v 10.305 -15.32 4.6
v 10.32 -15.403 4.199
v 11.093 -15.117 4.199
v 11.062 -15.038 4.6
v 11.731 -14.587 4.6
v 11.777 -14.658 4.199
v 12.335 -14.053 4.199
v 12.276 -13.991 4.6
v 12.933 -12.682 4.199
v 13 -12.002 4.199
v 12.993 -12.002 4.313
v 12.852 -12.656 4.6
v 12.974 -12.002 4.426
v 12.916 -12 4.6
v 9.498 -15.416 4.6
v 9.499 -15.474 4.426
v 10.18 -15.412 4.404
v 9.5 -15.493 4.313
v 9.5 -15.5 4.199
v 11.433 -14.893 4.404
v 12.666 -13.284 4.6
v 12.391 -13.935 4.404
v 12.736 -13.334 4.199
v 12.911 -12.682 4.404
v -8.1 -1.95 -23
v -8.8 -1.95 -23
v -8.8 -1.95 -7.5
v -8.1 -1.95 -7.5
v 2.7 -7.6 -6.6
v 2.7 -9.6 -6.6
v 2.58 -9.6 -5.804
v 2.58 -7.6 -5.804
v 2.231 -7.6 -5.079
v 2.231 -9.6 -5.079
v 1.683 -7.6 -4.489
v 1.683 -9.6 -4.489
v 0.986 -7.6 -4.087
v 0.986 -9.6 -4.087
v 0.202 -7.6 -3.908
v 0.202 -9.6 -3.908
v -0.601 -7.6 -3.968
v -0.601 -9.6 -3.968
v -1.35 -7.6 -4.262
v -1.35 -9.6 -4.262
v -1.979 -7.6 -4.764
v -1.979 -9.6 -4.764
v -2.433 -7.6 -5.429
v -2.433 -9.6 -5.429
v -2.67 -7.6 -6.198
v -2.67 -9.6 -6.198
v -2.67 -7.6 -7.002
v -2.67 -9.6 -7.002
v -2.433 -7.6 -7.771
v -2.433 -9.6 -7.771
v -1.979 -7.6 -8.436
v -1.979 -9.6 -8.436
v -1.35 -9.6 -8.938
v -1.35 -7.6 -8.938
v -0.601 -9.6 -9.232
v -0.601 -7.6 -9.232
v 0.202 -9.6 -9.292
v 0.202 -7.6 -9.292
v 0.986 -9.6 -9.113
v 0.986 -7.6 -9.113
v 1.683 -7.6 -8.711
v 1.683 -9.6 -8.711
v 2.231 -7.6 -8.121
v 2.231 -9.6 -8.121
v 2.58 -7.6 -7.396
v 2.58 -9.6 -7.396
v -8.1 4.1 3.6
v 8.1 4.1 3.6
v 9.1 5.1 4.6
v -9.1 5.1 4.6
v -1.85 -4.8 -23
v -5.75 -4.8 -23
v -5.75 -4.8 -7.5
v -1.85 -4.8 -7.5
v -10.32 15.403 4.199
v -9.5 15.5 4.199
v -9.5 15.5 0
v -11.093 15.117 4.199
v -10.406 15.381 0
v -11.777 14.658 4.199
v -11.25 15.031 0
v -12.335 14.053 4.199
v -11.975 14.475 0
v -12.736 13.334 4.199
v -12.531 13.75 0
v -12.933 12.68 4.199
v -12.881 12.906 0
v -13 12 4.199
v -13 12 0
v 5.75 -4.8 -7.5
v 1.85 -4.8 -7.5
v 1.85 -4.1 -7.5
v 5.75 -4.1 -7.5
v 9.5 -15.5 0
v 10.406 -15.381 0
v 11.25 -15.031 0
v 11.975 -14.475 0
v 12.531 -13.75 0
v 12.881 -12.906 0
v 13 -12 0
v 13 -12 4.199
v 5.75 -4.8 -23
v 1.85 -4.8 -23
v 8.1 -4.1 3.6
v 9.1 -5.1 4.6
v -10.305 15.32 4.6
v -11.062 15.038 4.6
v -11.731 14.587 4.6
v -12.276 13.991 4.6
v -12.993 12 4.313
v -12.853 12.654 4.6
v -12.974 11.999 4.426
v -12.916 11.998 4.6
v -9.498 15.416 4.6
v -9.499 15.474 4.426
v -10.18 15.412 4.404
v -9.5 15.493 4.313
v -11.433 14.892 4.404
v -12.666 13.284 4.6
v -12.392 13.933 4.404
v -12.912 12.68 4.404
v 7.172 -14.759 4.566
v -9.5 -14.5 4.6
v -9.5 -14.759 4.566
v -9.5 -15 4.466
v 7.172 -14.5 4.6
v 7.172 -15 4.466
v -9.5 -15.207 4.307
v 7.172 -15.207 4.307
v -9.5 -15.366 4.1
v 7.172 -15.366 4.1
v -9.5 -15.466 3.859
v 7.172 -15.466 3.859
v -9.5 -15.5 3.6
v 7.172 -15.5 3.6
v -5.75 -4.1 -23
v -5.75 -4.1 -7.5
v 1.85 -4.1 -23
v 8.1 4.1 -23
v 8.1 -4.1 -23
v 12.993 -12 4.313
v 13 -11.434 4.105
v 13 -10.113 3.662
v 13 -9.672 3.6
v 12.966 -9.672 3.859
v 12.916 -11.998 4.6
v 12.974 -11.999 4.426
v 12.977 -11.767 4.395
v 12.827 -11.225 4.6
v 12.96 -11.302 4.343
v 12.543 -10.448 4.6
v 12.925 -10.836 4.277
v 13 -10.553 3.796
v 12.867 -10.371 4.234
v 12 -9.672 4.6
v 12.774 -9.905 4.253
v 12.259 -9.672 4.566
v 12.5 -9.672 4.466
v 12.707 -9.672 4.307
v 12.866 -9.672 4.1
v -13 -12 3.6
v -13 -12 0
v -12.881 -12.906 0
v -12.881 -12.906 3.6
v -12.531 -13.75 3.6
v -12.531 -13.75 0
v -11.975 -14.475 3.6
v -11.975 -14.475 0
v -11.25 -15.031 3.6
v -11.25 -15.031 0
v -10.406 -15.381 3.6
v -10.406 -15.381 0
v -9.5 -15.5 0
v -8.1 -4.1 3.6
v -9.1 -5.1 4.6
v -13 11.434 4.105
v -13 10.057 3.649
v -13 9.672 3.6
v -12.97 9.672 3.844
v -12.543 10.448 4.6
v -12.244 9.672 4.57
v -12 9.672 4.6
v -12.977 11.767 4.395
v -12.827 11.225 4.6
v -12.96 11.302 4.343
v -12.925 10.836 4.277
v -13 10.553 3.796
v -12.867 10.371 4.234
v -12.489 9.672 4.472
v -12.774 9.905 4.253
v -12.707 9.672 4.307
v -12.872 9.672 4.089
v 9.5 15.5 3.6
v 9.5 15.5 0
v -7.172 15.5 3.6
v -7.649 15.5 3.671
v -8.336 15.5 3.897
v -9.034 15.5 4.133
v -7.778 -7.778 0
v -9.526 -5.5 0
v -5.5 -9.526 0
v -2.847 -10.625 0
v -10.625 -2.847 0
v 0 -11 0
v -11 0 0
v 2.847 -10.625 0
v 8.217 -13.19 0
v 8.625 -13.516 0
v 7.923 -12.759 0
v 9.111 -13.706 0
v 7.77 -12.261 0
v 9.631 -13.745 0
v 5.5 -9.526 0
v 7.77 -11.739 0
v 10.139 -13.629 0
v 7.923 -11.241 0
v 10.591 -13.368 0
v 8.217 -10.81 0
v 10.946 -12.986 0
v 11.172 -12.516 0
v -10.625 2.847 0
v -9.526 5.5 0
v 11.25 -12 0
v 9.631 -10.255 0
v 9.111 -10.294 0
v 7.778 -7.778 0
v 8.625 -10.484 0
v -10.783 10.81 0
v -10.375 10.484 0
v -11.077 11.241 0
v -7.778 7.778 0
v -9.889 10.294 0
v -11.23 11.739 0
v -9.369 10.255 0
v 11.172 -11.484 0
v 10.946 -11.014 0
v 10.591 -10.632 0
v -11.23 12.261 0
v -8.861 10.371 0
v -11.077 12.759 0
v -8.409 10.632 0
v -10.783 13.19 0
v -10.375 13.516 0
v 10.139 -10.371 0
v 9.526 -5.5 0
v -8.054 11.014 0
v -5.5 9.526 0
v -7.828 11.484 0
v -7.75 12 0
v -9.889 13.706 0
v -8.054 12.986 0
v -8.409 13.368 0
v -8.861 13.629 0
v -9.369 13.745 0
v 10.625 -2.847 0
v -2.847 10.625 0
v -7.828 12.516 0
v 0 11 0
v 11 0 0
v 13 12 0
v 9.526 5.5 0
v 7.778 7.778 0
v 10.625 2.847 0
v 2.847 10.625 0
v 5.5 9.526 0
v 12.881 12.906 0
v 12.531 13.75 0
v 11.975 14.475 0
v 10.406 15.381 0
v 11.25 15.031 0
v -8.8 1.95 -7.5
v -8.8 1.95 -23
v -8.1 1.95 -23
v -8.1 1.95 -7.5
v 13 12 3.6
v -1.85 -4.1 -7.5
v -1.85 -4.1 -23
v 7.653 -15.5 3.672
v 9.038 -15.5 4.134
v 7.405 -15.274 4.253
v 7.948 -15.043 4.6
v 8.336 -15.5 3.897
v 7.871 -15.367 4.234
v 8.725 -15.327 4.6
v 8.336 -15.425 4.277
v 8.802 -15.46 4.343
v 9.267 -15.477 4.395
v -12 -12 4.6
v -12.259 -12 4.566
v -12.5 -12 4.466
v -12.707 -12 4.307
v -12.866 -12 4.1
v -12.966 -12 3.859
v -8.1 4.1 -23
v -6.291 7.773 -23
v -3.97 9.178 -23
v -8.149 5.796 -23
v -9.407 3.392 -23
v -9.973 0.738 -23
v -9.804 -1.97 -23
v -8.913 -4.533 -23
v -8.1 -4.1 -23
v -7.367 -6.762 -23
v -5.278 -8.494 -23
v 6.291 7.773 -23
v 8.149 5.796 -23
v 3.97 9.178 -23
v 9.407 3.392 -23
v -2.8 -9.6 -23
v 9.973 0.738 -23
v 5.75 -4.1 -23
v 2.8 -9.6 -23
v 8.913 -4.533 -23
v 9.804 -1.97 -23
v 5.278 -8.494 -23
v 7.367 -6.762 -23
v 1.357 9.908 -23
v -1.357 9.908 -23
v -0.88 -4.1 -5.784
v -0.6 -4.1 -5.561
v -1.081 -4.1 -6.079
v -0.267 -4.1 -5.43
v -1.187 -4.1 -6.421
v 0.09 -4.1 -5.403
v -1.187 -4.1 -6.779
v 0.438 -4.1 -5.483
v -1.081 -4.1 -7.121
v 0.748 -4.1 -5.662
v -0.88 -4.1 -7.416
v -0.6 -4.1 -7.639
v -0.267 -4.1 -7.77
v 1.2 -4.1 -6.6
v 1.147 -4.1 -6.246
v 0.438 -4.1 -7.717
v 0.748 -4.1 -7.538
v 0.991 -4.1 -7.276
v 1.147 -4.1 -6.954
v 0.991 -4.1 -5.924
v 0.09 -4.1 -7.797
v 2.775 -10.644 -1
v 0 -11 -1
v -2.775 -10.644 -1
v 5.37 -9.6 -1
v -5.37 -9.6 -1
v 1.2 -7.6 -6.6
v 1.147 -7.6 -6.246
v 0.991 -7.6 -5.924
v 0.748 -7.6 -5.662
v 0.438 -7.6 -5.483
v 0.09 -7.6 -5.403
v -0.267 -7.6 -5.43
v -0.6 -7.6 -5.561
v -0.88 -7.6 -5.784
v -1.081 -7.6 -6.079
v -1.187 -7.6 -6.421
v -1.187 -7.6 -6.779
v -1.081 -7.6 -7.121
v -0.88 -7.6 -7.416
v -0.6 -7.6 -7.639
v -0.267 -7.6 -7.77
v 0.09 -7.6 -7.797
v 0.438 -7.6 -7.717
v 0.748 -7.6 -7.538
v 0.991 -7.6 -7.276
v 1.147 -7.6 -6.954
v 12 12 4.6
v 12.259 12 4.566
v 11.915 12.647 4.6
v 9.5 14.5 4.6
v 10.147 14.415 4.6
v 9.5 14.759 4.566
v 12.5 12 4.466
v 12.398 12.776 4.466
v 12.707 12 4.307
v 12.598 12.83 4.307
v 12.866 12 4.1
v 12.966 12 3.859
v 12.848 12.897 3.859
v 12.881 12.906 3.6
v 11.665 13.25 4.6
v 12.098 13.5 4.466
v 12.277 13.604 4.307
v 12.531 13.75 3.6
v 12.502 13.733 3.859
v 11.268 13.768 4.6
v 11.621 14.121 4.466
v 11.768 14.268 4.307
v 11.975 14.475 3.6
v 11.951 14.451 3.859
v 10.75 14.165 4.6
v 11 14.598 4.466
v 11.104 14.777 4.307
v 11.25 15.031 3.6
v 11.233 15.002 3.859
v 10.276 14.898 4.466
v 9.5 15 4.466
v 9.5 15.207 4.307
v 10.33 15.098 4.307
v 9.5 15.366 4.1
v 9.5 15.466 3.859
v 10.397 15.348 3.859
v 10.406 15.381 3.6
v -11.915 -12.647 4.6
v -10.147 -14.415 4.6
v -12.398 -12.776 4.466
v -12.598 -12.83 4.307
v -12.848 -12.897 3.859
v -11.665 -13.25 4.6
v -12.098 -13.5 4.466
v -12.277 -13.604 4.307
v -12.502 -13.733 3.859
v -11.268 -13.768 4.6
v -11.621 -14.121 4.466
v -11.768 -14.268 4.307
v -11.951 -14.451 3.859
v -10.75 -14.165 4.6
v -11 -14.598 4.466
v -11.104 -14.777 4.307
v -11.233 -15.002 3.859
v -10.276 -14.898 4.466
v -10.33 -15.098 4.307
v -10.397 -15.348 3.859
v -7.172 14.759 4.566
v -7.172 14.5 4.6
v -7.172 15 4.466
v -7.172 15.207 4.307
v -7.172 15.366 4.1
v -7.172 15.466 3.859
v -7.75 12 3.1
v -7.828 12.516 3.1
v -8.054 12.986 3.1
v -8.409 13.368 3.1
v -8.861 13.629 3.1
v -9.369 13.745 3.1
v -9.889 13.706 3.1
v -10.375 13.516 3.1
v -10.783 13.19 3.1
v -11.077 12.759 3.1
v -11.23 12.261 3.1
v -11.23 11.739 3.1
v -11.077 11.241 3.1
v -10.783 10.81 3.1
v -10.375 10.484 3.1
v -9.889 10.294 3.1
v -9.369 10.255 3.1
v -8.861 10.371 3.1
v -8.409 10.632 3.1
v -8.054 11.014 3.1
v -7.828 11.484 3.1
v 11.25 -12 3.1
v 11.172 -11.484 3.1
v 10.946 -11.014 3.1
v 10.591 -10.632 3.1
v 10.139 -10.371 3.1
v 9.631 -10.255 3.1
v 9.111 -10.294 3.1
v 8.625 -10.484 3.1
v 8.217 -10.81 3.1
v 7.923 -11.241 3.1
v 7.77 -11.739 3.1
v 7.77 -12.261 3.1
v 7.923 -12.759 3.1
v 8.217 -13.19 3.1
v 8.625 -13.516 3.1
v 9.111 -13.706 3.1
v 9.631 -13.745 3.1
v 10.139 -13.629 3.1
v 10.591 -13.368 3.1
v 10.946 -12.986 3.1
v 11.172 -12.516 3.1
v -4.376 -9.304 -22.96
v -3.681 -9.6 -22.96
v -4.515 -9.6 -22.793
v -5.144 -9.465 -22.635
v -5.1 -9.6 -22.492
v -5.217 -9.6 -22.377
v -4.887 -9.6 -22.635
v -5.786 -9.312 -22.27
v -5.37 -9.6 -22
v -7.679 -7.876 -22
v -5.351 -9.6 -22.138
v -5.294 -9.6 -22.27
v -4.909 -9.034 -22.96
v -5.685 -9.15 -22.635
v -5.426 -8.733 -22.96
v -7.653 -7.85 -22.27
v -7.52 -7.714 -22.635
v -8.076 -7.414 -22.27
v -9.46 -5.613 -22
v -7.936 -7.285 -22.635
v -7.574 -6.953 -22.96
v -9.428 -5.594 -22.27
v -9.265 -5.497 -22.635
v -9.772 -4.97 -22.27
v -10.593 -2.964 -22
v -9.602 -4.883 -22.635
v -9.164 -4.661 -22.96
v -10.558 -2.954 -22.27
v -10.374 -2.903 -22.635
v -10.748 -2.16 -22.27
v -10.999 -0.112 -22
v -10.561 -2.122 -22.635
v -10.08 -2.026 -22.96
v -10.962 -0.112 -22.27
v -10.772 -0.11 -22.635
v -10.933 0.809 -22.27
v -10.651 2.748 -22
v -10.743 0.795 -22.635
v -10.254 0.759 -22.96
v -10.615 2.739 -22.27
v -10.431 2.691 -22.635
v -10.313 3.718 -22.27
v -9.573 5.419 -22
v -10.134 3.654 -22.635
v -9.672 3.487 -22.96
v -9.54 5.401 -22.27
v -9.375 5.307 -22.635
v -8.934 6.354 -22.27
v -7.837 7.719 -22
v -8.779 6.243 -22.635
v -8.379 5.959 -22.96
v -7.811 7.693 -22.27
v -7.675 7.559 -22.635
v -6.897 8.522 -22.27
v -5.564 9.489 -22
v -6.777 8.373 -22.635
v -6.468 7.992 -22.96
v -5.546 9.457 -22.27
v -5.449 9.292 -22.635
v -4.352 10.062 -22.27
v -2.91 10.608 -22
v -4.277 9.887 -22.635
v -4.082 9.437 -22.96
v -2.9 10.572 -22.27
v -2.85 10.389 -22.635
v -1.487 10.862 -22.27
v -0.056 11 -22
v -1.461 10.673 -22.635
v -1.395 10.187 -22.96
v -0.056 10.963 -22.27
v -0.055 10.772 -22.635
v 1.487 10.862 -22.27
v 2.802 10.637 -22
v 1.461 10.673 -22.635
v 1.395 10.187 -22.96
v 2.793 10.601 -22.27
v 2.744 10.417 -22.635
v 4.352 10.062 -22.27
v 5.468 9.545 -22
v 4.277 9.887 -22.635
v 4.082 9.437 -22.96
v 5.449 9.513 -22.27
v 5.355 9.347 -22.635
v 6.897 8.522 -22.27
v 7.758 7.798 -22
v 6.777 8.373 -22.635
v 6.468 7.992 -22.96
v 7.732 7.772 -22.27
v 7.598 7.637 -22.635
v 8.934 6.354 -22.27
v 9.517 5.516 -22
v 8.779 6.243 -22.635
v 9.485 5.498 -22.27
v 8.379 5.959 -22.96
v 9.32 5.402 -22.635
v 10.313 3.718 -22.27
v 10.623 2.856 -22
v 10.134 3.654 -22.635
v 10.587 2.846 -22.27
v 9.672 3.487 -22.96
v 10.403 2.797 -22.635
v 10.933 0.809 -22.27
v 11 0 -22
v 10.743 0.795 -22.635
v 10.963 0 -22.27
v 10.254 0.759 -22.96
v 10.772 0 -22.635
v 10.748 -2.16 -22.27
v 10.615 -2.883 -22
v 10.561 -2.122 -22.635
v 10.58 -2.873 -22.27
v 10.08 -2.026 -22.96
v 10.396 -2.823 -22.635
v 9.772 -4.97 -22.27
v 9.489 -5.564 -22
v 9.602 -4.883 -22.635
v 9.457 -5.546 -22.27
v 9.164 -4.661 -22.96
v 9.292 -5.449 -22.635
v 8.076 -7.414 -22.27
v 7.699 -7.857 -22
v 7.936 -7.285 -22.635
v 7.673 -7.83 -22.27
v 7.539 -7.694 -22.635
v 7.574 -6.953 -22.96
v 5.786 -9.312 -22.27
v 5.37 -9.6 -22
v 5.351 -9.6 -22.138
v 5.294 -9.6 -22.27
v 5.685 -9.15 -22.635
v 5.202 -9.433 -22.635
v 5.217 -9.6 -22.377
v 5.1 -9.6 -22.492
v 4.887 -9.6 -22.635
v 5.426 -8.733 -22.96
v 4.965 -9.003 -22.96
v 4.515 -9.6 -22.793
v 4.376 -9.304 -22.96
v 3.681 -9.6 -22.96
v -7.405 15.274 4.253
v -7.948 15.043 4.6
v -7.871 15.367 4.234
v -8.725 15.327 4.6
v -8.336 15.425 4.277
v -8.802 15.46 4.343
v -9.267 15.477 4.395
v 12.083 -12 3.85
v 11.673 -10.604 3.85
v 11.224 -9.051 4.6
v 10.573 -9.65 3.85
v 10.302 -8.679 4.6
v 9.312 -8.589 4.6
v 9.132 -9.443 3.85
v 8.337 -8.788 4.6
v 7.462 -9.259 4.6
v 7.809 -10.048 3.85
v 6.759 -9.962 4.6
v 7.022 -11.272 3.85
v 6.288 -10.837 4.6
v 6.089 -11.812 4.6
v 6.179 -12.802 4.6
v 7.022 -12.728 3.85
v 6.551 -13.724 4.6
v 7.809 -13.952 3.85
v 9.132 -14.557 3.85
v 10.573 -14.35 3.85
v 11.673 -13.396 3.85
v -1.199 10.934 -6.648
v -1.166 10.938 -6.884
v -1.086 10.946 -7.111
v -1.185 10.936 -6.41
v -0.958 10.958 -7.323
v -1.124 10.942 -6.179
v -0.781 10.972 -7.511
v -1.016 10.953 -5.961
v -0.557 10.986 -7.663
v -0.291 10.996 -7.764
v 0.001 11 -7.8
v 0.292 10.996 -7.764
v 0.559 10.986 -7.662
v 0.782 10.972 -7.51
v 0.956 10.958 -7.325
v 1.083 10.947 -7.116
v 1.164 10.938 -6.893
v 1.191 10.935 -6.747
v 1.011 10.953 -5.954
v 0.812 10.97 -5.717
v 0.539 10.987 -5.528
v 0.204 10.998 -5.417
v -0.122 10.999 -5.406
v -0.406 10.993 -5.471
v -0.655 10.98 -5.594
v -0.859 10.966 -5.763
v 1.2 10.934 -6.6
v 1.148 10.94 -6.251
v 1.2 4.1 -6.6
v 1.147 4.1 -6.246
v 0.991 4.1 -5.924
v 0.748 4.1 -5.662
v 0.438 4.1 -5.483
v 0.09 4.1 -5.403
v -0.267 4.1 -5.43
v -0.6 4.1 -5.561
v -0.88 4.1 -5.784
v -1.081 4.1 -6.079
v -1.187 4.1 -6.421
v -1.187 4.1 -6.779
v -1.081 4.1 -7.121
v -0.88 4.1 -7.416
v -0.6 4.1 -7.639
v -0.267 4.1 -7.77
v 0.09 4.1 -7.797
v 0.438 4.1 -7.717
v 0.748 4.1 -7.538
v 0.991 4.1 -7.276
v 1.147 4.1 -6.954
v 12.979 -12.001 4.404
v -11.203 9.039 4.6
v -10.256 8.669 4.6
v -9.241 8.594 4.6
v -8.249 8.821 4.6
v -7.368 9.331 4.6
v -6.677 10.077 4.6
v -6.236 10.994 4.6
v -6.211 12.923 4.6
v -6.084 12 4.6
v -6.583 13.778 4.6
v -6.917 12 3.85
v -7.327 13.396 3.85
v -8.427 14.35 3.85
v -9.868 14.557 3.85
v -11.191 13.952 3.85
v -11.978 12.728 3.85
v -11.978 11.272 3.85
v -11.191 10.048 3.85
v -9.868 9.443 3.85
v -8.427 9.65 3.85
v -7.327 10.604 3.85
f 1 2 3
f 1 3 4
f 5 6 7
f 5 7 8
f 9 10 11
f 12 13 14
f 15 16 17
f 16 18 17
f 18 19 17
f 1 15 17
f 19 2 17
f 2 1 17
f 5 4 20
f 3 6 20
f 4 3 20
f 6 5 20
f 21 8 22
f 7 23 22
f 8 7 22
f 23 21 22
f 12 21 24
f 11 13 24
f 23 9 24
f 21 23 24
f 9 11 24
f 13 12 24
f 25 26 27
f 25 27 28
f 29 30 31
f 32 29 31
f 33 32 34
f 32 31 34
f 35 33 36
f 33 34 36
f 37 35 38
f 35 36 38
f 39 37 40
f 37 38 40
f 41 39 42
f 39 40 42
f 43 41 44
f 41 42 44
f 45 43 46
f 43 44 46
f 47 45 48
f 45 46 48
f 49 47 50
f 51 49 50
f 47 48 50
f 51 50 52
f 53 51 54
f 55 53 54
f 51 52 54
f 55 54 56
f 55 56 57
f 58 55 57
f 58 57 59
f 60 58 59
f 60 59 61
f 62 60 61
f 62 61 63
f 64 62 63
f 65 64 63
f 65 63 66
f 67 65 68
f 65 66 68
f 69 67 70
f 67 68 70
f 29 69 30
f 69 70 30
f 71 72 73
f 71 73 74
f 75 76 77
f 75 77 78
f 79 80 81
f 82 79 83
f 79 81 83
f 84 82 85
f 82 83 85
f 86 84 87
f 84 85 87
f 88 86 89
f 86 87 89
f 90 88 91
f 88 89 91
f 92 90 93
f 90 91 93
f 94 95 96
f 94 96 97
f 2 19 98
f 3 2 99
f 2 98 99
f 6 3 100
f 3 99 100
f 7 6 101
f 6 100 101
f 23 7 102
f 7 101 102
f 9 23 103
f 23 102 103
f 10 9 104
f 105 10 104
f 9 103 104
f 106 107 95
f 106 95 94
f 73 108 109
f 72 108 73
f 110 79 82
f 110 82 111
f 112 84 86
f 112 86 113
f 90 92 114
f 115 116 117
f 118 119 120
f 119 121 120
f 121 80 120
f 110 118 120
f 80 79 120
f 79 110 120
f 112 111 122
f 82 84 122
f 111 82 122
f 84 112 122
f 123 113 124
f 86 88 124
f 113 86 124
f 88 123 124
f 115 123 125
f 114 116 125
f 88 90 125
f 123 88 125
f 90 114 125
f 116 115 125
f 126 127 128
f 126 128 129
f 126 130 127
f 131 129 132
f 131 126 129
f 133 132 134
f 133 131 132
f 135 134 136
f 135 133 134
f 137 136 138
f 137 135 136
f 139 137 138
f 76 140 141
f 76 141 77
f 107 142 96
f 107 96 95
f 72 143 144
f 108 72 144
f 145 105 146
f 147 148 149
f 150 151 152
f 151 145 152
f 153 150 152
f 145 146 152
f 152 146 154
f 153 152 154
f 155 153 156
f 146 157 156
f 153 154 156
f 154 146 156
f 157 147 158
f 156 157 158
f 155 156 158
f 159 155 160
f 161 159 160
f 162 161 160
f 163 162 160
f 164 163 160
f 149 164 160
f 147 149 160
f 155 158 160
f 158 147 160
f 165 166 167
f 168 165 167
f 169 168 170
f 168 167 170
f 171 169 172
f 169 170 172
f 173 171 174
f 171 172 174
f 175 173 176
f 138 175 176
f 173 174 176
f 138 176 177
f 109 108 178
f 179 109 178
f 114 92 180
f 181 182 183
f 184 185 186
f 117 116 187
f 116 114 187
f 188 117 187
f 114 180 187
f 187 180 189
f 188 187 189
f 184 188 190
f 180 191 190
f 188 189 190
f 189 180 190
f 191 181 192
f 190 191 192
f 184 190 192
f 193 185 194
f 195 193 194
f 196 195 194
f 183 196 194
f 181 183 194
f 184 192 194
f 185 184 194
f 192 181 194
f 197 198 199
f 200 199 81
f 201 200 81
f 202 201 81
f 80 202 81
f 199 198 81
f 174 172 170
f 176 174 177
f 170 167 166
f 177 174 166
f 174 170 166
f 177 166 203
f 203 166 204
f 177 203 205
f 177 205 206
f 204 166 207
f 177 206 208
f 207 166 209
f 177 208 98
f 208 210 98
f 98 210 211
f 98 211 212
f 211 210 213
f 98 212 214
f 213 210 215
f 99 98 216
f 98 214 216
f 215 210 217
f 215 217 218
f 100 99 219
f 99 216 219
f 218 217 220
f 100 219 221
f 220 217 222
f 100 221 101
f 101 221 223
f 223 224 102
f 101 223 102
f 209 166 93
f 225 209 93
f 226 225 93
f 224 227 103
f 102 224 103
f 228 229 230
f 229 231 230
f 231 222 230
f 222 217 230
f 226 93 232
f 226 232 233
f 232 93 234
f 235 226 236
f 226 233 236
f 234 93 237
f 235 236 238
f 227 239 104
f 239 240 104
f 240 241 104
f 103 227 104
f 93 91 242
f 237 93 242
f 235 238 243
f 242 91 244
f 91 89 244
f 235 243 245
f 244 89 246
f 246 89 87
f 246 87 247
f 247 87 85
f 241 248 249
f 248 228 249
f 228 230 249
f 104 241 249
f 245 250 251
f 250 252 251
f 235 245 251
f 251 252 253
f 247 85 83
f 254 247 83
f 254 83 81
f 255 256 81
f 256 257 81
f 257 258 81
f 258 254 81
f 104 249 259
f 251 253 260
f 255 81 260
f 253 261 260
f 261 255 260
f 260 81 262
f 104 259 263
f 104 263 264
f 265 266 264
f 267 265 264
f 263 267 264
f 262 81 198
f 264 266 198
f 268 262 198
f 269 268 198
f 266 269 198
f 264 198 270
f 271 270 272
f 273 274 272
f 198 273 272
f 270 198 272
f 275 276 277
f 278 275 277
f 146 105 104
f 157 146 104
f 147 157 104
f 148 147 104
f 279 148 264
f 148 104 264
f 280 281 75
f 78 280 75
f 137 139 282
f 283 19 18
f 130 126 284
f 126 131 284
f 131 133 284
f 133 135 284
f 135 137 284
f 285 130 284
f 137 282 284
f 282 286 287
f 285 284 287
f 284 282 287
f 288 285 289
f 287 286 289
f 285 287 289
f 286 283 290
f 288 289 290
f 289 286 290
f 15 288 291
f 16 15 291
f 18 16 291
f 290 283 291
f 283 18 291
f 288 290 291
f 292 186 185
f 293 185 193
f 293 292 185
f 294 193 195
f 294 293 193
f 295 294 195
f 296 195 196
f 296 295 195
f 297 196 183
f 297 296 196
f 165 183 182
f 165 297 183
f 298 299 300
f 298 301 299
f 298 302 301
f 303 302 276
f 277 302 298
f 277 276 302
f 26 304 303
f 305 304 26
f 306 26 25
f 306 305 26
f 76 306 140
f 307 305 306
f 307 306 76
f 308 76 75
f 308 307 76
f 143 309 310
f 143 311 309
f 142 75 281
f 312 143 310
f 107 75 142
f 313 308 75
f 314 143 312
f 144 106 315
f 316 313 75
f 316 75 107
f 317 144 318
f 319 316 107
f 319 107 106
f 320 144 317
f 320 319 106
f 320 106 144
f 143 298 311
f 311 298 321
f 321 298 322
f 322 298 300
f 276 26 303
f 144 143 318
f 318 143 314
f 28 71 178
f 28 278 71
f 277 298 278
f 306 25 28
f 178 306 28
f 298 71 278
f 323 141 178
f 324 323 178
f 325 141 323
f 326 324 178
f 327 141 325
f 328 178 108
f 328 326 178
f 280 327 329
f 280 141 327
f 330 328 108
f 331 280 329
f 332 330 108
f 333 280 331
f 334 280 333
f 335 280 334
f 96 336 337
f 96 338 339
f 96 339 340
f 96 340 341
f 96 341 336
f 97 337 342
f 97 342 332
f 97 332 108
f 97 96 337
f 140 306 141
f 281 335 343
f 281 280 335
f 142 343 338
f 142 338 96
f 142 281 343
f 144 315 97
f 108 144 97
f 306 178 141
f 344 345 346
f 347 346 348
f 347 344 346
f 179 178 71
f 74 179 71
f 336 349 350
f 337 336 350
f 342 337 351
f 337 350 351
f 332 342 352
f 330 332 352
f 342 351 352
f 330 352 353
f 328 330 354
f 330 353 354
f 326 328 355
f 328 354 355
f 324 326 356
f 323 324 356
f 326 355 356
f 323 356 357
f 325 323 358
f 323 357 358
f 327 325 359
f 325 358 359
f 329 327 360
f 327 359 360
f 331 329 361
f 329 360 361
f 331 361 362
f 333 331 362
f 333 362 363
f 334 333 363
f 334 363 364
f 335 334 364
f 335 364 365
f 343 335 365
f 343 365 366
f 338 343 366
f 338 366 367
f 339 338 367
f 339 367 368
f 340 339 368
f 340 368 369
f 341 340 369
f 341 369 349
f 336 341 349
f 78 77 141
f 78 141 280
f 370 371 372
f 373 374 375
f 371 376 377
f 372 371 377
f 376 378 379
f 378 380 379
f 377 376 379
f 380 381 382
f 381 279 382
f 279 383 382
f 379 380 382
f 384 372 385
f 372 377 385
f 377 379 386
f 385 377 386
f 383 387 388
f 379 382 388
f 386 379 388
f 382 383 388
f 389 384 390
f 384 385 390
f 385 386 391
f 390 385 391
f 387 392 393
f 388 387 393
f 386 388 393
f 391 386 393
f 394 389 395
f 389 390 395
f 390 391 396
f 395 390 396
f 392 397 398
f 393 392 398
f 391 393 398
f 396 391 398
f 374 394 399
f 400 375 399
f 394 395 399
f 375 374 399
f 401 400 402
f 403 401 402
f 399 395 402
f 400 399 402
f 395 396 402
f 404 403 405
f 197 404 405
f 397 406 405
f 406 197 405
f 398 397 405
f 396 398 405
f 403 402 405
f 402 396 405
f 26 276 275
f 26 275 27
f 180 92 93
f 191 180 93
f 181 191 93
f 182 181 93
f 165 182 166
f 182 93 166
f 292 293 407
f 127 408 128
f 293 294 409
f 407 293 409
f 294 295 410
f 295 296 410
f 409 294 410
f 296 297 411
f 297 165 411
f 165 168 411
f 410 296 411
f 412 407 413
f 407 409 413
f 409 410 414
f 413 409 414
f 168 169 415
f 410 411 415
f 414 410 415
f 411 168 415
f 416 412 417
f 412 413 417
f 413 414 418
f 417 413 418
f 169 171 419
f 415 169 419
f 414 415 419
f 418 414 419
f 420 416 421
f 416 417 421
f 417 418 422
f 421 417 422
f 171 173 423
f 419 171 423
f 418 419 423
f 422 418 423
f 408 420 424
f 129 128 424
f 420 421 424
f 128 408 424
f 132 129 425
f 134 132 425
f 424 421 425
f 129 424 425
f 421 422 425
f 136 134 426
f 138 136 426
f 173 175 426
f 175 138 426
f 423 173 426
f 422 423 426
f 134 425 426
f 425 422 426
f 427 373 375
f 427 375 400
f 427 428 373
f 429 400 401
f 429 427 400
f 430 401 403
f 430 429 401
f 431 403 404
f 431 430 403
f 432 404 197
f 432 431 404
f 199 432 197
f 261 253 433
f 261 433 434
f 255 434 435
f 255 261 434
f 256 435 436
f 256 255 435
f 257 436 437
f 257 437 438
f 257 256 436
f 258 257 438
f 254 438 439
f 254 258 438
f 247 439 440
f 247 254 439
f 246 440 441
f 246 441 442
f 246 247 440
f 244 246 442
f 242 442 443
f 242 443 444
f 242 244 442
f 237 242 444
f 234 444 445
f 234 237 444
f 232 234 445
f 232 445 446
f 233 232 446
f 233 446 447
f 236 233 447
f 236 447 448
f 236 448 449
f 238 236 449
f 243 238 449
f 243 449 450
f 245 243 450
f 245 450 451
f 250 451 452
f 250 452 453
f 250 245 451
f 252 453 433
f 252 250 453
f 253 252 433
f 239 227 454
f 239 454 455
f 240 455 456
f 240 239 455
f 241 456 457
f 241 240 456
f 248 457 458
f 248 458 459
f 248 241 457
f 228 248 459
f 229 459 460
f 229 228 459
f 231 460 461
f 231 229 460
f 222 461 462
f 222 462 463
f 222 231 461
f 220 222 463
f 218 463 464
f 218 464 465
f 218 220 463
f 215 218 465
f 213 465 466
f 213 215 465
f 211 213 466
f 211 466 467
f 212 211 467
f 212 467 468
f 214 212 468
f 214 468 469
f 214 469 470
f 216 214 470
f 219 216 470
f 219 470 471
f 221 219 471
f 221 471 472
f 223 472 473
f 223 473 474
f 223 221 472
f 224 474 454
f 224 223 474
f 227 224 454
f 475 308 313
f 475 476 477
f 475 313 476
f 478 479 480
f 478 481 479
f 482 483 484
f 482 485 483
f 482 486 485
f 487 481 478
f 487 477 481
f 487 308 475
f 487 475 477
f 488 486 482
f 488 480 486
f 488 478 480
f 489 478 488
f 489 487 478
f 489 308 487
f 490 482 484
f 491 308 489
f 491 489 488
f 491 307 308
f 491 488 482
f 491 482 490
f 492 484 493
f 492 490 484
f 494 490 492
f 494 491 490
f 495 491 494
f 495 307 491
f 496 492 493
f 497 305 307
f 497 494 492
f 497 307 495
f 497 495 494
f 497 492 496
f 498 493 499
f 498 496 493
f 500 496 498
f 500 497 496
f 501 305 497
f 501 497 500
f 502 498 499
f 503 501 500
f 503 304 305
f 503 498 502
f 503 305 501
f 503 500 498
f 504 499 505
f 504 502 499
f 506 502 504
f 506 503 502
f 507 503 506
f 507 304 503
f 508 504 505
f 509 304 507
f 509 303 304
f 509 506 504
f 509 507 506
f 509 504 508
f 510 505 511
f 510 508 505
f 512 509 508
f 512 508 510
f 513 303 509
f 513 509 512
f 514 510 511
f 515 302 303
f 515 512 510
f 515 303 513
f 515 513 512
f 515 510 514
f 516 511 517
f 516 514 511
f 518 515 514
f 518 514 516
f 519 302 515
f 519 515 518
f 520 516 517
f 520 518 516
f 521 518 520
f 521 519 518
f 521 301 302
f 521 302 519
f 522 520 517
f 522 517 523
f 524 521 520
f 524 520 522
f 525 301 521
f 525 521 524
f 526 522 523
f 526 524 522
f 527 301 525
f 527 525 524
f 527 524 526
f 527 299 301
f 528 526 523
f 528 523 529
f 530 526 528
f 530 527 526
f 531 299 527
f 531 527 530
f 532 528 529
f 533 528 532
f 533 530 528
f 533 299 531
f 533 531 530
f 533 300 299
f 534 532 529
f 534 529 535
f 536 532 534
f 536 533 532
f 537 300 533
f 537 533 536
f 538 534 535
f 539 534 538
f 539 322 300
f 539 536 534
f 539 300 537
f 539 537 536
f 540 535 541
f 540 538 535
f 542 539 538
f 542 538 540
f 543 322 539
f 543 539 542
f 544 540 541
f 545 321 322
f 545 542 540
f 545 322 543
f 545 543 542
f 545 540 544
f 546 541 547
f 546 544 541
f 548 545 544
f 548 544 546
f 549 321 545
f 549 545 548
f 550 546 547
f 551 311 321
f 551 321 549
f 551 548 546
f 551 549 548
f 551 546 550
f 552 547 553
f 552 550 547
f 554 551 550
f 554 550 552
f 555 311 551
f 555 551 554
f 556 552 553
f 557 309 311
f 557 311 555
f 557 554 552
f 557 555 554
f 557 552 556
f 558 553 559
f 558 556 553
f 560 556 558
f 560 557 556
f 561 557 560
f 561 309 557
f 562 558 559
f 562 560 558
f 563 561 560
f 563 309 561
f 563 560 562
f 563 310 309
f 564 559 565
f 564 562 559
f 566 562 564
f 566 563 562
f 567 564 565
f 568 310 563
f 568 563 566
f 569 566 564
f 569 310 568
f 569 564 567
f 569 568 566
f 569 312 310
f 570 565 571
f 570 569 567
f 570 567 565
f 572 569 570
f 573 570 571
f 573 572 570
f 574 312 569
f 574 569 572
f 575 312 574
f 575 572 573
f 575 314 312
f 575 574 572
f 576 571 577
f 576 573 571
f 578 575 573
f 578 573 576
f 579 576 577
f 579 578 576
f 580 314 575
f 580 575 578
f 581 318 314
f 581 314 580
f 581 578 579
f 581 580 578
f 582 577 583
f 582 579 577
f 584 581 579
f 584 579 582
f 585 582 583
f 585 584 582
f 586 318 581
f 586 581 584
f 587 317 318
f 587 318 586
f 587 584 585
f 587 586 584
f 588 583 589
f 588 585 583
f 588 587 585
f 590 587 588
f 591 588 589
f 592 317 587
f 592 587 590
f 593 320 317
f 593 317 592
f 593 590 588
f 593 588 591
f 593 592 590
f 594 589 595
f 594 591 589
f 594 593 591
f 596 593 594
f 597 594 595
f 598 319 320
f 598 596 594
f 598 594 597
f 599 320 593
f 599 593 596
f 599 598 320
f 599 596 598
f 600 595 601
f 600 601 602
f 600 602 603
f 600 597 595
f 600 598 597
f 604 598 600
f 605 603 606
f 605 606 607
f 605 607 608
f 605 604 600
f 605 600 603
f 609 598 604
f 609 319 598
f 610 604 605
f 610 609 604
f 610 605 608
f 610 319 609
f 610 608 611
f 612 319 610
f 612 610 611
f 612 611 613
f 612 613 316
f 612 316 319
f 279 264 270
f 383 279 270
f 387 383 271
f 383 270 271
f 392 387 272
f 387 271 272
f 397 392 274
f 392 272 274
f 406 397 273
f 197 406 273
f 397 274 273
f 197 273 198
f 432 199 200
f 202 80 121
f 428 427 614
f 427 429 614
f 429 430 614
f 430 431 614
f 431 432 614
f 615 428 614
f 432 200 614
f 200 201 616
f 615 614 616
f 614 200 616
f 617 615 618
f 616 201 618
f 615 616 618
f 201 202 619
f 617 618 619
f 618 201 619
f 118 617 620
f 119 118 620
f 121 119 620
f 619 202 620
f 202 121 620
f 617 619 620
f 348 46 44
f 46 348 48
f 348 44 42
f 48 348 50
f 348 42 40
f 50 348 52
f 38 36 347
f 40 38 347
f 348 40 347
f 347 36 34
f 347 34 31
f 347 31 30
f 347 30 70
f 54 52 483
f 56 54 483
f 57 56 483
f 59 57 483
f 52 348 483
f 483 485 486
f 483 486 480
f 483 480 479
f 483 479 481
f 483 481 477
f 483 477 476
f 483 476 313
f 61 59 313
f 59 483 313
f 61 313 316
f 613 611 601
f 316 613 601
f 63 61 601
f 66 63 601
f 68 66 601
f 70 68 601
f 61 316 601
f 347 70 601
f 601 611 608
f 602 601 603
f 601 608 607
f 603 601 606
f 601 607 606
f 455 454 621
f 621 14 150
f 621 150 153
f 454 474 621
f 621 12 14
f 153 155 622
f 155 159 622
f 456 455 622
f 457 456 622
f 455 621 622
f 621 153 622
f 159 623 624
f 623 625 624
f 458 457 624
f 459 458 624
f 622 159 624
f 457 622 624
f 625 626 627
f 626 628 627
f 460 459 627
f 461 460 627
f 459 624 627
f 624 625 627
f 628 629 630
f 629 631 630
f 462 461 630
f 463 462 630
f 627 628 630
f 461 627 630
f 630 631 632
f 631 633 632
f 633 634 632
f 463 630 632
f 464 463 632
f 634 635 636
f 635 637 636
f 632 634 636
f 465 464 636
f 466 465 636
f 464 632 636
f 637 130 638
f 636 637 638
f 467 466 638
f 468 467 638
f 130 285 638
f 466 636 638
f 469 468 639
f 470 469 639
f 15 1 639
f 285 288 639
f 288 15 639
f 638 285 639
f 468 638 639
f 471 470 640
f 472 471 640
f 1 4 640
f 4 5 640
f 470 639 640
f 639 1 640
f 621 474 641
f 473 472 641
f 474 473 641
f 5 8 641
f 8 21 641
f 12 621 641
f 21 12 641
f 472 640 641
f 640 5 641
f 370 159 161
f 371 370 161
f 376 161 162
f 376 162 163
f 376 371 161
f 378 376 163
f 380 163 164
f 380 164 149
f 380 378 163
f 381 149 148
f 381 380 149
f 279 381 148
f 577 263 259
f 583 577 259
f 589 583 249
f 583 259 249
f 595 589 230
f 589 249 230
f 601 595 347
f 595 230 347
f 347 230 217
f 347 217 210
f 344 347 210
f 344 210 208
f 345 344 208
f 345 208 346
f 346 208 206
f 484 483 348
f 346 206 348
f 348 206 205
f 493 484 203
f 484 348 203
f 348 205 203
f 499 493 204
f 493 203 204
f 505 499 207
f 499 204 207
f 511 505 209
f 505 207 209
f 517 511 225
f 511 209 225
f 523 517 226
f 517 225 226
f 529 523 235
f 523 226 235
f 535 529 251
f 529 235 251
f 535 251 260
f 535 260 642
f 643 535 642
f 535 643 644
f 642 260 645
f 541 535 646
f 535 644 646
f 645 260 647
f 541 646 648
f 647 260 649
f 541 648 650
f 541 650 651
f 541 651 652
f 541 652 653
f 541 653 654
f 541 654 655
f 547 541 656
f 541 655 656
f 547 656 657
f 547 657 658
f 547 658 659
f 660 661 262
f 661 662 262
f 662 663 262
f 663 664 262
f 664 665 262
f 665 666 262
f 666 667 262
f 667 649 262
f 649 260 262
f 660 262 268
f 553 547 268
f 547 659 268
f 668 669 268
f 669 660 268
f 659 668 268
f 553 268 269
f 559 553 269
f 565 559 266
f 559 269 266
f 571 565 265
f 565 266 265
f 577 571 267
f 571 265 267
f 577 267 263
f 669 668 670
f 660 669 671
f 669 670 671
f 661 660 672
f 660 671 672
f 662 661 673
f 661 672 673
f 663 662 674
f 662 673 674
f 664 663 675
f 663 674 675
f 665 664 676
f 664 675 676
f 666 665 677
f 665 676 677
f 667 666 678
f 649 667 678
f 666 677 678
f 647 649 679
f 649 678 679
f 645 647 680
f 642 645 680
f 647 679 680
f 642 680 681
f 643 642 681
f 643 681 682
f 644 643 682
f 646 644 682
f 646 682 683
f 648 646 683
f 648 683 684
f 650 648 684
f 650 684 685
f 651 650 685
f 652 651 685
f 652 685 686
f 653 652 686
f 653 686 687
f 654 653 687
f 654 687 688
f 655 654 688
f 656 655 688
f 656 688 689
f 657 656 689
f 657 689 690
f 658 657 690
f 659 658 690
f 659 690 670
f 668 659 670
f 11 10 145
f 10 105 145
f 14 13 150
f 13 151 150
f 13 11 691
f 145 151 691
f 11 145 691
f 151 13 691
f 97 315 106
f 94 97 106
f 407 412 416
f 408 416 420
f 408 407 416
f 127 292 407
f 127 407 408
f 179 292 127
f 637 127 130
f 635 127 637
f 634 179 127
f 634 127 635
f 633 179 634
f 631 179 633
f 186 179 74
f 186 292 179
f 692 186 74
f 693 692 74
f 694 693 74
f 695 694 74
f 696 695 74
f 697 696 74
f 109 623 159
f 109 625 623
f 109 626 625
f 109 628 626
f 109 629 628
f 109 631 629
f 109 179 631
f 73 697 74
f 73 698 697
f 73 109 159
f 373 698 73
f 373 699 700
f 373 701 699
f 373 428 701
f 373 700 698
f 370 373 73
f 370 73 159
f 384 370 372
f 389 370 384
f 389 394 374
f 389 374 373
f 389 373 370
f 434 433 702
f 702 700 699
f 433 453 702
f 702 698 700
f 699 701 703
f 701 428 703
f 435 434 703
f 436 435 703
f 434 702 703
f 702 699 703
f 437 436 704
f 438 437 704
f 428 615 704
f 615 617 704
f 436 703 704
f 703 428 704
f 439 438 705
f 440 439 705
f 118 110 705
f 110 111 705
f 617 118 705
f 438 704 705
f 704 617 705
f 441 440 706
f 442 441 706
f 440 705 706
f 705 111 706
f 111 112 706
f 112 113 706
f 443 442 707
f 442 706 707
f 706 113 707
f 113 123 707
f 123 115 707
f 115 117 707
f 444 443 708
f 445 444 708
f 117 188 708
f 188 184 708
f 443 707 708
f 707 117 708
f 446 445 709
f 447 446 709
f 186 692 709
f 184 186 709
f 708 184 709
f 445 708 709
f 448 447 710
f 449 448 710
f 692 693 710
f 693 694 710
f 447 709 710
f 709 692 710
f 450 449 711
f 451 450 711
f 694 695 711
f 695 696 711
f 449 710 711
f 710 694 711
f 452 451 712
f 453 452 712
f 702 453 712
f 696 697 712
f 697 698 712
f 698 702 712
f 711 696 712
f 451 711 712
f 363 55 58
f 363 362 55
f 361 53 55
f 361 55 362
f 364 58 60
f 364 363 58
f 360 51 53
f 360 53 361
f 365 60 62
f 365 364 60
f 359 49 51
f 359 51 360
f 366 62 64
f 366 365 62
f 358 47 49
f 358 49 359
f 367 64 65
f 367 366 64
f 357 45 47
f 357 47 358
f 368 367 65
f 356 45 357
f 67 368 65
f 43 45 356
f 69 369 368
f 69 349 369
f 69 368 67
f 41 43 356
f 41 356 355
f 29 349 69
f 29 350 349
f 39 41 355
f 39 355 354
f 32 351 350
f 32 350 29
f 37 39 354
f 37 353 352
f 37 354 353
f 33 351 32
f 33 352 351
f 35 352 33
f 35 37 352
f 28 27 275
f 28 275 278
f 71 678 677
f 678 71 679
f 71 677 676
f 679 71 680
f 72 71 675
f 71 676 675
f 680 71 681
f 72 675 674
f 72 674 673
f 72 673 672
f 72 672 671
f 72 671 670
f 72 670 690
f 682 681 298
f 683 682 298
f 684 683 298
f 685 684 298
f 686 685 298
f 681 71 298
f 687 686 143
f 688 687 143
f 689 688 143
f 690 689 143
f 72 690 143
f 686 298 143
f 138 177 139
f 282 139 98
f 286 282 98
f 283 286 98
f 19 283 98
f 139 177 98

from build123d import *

# Parameters (mm, degrees)
SKETCH_R        = 1.75
PAD_DEPTH       = 4.6
SKETCH001_R     = 11
SKETCH001_W     = 16.2
SKETCH001_H     = 8.2
PAD001_DEPTH    = 23
SKETCH002_W     = 16.2
SKETCH002_H     = 8.2
POCKET_DEPTH    = 4.601
SKETCH003_W     = 0.7
SKETCH003_H     = 3.9
SKETCH003_W_2   = 3.9
SKETCH003_H_2   = 0.7
POCKET001_DEPTH = 15.5
FILLET001_R     = 1
SKETCH004_W     = 10.740578
SKETCH004_H     = 1.4
POCKET002_DEPTH = 22
SKETCH005_R     = 1.2
POCKET003_DEPTH = 25.101
SKETCH006_R     = 2.7
POCKET004_DEPTH = 2
CHAMFER_1_ANGLE = 48
CHAMFER_1_SIZE  = 1.5
CHAMFER_2_ANGLE = 48
CHAMFER_2_SIZE  = 1.5
FILLET_R        = 1
CHAMFER001_SIZE = 1


with BuildPart() as part:
    # Sketch → Pad (new body)
    with BuildSketch(Plane.XY):
        with BuildLine():
            Line((-13, 12), (-13, -12))
            ThreePointArc((-13, -12), (-11.974874, -14.474874), (-9.5, -15.5))
            Line((-9.5, -15.5), (9.5, -15.5))
            ThreePointArc((9.5, -15.5), (11.974874, -14.474874), (13, -12))
            Line((13, -12), (13, 12))
            ThreePointArc((13, 12), (11.974874, 14.474874), (9.5, 15.5))
            Line((9.5, 15.5), (-9.5, 15.5))
            ThreePointArc((-9.5, 15.5), (-11.974874, 14.474874), (-13, 12))
        make_face()
        with Locations((-9.5, 12)):
            Circle(SKETCH_R, mode=Mode.SUBTRACT)
        with Locations((9.5, -12)):
            Circle(SKETCH_R, mode=Mode.SUBTRACT)
    extrude(amount=PAD_DEPTH)

    # Sketch001 → Pad001 (join)
    with BuildSketch(Plane(origin=(0, 0, 0), x_dir=(1, 0, 0), z_dir=(0, 0, -1))):
        Circle(SKETCH001_R)
        Rectangle(SKETCH001_W, SKETCH001_H, mode=Mode.SUBTRACT)
    extrude(amount=PAD001_DEPTH)

    # Sketch002 (on Face19 of Pad001) → Pocket (cut, through all)
    with BuildSketch(Plane(origin=(0, 0, 0), x_dir=(1, 0, 0), z_dir=(0, 0, -1))):
        Rectangle(SKETCH002_W, SKETCH002_H)
    extrude(amount=-POCKET_DEPTH, mode=Mode.SUBTRACT)

    # Sketch003 → Pocket001 (cut)
    with BuildSketch(Plane(origin=(0, 0, -23), x_dir=(1, 0, 0), z_dir=(0, 0, -1))):
        with Locations((-8.45, 0)):
            Rectangle(SKETCH003_W, SKETCH003_H)
        with Locations((-3.8, 4.45)):
            Rectangle(SKETCH003_W_2, SKETCH003_H_2)
        with Locations((3.8, 4.45)):
            Rectangle(SKETCH003_W_2, SKETCH003_H_2)
    extrude(amount=-POCKET001_DEPTH, mode=Mode.SUBTRACT)

    # Fillet001
    fillet001_edges = [part.edges().sort_by_distance(p)[0] for p in [
        (-11, 0, -23),
    ]]
    fillet(fillet001_edges, radius=FILLET001_R)

    # Sketch004 (on Face4 of Fillet001) → Pocket002 (cut)
    with BuildSketch(Plane(origin=(0, 0, -23), x_dir=(1, 0, 0), z_dir=(0, 0, -1))):
        with Locations((0, 10.3)):
            Rectangle(SKETCH004_W, SKETCH004_H)
    extrude(amount=-POCKET002_DEPTH, mode=Mode.SUBTRACT)

    # Sketch005 (on Face3 of Pocket002) → Pocket003 (cut, through all)
    with BuildSketch(Plane.XZ.offset(9.6)):
        with Locations((0, -6.6)):
            Circle(SKETCH005_R)
    extrude(amount=-POCKET003_DEPTH, mode=Mode.SUBTRACT)

    # Sketch006 (on Face2 of Pocket003) → Pocket004 (cut)
    with BuildSketch(Plane.XZ.offset(9.6)):
        with Locations((0, -6.6)):
            Circle(SKETCH006_R)
    extrude(amount=-POCKET004_DEPTH, mode=Mode.SUBTRACT)

    # Chamfer 1
    chamfer_1_edges = [part.edges().sort_by_distance(p)[0] for p in [
        (-11.25, 12, 4.6),
    ]]
    chamfer_1_side = part.faces().sort_by_distance((-11.25, 12, 2.3))[0]
    chamfer(chamfer_1_edges, length=CHAMFER_1_SIZE, angle=CHAMFER_1_ANGLE, reference=chamfer_1_side)

    # Chamfer 2
    chamfer_2_edges = [part.edges().sort_by_distance(p)[0] for p in [
        (7.75, -12, 4.6),
    ]]
    chamfer_2_side = part.faces().sort_by_distance((7.75, -12, 2.3))[0]
    chamfer(chamfer_2_edges, length=CHAMFER_2_SIZE, angle=CHAMFER_2_ANGLE, reference=chamfer_2_side)

    # Fillet
    fillet_edges = [part.edges().sort_by_distance(p)[0] for p in [
        (13, 0, 4.6),
        (0, -15.5, 4.6),
        (-13, 0, 4.6),
        (-11.974874, -14.474874, 4.6),
        (11.974874, 14.474874, 4.6),
        (0, 15.5, 4.6),
        (11.974874, -14.474874, 4.6),
        (-11.974874, 14.474874, 4.6),
    ]]
    fillet(fillet_edges, radius=FILLET_R)

    # Chamfer001
    chamfer001_edges = [part.edges().sort_by_distance(p)[0] for p in [
        (0, -4.1, 4.6),
        (-8.1, 0, 4.6),
        (0, 4.1, 4.6),
        (8.1, 0, 4.6),
    ]]
    chamfer(chamfer001_edges, length=CHAMFER001_SIZE)


solid = part.part
